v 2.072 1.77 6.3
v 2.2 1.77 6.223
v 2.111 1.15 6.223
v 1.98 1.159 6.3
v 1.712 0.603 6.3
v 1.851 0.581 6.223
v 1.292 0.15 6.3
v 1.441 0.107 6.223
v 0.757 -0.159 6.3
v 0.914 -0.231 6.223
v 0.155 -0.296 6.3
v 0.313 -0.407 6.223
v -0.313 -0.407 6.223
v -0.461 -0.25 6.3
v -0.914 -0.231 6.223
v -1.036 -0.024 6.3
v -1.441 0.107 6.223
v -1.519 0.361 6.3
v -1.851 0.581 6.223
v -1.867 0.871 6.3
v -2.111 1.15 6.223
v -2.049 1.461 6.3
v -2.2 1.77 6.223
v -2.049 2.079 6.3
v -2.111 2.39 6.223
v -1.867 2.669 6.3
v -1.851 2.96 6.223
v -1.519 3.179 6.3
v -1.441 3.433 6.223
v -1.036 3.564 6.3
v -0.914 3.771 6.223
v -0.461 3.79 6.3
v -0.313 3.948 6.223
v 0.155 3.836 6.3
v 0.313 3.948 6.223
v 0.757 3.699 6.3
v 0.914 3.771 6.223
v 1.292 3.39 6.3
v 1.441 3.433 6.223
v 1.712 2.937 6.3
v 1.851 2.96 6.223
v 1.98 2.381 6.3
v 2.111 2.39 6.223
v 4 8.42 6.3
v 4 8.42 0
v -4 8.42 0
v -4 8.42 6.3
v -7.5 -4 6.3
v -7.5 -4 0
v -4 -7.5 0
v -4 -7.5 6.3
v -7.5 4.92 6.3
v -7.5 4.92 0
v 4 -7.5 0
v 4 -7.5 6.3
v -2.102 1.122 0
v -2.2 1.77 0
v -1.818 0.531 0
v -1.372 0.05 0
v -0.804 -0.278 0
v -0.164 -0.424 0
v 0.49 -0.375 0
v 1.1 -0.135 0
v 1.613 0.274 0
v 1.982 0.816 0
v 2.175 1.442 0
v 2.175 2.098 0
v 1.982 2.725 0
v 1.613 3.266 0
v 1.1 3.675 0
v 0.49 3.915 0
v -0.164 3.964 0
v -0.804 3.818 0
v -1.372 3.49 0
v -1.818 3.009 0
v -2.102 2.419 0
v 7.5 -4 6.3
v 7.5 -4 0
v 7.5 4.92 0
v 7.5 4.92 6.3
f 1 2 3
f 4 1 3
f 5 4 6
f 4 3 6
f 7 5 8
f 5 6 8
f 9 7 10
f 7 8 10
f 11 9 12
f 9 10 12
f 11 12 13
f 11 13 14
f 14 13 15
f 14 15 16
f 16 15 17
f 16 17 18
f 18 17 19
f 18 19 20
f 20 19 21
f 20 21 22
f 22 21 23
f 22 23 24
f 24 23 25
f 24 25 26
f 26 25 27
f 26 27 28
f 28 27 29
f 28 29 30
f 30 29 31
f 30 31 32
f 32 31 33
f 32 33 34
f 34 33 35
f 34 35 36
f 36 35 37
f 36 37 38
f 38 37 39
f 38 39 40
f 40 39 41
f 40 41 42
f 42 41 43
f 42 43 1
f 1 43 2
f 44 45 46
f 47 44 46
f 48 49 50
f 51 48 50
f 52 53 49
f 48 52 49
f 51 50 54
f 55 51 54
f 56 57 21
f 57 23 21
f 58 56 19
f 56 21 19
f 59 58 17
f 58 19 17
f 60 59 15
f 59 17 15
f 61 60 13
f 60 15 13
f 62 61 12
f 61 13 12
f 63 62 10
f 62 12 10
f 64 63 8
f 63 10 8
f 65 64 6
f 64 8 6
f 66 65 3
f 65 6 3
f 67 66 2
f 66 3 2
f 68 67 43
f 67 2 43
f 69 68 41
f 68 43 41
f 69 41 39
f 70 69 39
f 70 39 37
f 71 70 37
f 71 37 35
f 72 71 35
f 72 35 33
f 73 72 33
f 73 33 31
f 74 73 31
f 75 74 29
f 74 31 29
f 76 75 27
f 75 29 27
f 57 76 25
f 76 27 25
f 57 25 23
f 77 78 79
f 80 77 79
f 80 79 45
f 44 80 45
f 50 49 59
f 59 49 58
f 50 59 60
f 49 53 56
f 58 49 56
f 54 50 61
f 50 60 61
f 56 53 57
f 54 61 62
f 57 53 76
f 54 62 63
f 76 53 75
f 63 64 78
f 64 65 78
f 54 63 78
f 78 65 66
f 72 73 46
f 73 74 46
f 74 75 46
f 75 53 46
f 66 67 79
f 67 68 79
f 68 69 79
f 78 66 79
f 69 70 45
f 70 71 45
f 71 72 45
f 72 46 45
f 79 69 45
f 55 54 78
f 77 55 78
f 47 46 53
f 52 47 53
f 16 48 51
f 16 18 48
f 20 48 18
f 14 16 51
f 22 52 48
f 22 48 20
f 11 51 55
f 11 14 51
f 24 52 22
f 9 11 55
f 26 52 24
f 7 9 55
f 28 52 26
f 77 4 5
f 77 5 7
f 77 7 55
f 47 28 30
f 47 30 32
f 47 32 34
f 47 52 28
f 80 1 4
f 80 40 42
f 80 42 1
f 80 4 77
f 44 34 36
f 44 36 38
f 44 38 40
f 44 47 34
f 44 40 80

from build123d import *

# Parameters (mm, degrees)
F1_DEPTH = 6.3
F3_D     = 4.4
F3_DEPTH = 6.223
F3_TIP   = 1.3218933619


with BuildPart() as f1:
    # F0 (on Top) → F1 (new body)
    with BuildSketch(Plane.XY):
        Polygon((4, 8.4201077782), (-4, 8.4201077782), (-7.5, 4.9201077782), (-7.5, -4), (-4, -7.5), (4, -7.5), (7.5, -4), (7.5, 4.9201077782), align=None)
    extrude(amount=F1_DEPTH)

    # F3
    with Locations(Plane(origin=(0, 0, 0), x_dir=(1, 0, 0), z_dir=(0, 0, -1))):
        with Locations((0, -1.7701077782)):
            Hole(F3_D / 2, depth=F3_DEPTH)
            with Locations((0, 0, -(F3_DEPTH + F3_TIP / 2))):  # 118° drill point
                Cone(0, F3_D / 2, F3_TIP, mode=Mode.SUBTRACT)


solid = f1.part
